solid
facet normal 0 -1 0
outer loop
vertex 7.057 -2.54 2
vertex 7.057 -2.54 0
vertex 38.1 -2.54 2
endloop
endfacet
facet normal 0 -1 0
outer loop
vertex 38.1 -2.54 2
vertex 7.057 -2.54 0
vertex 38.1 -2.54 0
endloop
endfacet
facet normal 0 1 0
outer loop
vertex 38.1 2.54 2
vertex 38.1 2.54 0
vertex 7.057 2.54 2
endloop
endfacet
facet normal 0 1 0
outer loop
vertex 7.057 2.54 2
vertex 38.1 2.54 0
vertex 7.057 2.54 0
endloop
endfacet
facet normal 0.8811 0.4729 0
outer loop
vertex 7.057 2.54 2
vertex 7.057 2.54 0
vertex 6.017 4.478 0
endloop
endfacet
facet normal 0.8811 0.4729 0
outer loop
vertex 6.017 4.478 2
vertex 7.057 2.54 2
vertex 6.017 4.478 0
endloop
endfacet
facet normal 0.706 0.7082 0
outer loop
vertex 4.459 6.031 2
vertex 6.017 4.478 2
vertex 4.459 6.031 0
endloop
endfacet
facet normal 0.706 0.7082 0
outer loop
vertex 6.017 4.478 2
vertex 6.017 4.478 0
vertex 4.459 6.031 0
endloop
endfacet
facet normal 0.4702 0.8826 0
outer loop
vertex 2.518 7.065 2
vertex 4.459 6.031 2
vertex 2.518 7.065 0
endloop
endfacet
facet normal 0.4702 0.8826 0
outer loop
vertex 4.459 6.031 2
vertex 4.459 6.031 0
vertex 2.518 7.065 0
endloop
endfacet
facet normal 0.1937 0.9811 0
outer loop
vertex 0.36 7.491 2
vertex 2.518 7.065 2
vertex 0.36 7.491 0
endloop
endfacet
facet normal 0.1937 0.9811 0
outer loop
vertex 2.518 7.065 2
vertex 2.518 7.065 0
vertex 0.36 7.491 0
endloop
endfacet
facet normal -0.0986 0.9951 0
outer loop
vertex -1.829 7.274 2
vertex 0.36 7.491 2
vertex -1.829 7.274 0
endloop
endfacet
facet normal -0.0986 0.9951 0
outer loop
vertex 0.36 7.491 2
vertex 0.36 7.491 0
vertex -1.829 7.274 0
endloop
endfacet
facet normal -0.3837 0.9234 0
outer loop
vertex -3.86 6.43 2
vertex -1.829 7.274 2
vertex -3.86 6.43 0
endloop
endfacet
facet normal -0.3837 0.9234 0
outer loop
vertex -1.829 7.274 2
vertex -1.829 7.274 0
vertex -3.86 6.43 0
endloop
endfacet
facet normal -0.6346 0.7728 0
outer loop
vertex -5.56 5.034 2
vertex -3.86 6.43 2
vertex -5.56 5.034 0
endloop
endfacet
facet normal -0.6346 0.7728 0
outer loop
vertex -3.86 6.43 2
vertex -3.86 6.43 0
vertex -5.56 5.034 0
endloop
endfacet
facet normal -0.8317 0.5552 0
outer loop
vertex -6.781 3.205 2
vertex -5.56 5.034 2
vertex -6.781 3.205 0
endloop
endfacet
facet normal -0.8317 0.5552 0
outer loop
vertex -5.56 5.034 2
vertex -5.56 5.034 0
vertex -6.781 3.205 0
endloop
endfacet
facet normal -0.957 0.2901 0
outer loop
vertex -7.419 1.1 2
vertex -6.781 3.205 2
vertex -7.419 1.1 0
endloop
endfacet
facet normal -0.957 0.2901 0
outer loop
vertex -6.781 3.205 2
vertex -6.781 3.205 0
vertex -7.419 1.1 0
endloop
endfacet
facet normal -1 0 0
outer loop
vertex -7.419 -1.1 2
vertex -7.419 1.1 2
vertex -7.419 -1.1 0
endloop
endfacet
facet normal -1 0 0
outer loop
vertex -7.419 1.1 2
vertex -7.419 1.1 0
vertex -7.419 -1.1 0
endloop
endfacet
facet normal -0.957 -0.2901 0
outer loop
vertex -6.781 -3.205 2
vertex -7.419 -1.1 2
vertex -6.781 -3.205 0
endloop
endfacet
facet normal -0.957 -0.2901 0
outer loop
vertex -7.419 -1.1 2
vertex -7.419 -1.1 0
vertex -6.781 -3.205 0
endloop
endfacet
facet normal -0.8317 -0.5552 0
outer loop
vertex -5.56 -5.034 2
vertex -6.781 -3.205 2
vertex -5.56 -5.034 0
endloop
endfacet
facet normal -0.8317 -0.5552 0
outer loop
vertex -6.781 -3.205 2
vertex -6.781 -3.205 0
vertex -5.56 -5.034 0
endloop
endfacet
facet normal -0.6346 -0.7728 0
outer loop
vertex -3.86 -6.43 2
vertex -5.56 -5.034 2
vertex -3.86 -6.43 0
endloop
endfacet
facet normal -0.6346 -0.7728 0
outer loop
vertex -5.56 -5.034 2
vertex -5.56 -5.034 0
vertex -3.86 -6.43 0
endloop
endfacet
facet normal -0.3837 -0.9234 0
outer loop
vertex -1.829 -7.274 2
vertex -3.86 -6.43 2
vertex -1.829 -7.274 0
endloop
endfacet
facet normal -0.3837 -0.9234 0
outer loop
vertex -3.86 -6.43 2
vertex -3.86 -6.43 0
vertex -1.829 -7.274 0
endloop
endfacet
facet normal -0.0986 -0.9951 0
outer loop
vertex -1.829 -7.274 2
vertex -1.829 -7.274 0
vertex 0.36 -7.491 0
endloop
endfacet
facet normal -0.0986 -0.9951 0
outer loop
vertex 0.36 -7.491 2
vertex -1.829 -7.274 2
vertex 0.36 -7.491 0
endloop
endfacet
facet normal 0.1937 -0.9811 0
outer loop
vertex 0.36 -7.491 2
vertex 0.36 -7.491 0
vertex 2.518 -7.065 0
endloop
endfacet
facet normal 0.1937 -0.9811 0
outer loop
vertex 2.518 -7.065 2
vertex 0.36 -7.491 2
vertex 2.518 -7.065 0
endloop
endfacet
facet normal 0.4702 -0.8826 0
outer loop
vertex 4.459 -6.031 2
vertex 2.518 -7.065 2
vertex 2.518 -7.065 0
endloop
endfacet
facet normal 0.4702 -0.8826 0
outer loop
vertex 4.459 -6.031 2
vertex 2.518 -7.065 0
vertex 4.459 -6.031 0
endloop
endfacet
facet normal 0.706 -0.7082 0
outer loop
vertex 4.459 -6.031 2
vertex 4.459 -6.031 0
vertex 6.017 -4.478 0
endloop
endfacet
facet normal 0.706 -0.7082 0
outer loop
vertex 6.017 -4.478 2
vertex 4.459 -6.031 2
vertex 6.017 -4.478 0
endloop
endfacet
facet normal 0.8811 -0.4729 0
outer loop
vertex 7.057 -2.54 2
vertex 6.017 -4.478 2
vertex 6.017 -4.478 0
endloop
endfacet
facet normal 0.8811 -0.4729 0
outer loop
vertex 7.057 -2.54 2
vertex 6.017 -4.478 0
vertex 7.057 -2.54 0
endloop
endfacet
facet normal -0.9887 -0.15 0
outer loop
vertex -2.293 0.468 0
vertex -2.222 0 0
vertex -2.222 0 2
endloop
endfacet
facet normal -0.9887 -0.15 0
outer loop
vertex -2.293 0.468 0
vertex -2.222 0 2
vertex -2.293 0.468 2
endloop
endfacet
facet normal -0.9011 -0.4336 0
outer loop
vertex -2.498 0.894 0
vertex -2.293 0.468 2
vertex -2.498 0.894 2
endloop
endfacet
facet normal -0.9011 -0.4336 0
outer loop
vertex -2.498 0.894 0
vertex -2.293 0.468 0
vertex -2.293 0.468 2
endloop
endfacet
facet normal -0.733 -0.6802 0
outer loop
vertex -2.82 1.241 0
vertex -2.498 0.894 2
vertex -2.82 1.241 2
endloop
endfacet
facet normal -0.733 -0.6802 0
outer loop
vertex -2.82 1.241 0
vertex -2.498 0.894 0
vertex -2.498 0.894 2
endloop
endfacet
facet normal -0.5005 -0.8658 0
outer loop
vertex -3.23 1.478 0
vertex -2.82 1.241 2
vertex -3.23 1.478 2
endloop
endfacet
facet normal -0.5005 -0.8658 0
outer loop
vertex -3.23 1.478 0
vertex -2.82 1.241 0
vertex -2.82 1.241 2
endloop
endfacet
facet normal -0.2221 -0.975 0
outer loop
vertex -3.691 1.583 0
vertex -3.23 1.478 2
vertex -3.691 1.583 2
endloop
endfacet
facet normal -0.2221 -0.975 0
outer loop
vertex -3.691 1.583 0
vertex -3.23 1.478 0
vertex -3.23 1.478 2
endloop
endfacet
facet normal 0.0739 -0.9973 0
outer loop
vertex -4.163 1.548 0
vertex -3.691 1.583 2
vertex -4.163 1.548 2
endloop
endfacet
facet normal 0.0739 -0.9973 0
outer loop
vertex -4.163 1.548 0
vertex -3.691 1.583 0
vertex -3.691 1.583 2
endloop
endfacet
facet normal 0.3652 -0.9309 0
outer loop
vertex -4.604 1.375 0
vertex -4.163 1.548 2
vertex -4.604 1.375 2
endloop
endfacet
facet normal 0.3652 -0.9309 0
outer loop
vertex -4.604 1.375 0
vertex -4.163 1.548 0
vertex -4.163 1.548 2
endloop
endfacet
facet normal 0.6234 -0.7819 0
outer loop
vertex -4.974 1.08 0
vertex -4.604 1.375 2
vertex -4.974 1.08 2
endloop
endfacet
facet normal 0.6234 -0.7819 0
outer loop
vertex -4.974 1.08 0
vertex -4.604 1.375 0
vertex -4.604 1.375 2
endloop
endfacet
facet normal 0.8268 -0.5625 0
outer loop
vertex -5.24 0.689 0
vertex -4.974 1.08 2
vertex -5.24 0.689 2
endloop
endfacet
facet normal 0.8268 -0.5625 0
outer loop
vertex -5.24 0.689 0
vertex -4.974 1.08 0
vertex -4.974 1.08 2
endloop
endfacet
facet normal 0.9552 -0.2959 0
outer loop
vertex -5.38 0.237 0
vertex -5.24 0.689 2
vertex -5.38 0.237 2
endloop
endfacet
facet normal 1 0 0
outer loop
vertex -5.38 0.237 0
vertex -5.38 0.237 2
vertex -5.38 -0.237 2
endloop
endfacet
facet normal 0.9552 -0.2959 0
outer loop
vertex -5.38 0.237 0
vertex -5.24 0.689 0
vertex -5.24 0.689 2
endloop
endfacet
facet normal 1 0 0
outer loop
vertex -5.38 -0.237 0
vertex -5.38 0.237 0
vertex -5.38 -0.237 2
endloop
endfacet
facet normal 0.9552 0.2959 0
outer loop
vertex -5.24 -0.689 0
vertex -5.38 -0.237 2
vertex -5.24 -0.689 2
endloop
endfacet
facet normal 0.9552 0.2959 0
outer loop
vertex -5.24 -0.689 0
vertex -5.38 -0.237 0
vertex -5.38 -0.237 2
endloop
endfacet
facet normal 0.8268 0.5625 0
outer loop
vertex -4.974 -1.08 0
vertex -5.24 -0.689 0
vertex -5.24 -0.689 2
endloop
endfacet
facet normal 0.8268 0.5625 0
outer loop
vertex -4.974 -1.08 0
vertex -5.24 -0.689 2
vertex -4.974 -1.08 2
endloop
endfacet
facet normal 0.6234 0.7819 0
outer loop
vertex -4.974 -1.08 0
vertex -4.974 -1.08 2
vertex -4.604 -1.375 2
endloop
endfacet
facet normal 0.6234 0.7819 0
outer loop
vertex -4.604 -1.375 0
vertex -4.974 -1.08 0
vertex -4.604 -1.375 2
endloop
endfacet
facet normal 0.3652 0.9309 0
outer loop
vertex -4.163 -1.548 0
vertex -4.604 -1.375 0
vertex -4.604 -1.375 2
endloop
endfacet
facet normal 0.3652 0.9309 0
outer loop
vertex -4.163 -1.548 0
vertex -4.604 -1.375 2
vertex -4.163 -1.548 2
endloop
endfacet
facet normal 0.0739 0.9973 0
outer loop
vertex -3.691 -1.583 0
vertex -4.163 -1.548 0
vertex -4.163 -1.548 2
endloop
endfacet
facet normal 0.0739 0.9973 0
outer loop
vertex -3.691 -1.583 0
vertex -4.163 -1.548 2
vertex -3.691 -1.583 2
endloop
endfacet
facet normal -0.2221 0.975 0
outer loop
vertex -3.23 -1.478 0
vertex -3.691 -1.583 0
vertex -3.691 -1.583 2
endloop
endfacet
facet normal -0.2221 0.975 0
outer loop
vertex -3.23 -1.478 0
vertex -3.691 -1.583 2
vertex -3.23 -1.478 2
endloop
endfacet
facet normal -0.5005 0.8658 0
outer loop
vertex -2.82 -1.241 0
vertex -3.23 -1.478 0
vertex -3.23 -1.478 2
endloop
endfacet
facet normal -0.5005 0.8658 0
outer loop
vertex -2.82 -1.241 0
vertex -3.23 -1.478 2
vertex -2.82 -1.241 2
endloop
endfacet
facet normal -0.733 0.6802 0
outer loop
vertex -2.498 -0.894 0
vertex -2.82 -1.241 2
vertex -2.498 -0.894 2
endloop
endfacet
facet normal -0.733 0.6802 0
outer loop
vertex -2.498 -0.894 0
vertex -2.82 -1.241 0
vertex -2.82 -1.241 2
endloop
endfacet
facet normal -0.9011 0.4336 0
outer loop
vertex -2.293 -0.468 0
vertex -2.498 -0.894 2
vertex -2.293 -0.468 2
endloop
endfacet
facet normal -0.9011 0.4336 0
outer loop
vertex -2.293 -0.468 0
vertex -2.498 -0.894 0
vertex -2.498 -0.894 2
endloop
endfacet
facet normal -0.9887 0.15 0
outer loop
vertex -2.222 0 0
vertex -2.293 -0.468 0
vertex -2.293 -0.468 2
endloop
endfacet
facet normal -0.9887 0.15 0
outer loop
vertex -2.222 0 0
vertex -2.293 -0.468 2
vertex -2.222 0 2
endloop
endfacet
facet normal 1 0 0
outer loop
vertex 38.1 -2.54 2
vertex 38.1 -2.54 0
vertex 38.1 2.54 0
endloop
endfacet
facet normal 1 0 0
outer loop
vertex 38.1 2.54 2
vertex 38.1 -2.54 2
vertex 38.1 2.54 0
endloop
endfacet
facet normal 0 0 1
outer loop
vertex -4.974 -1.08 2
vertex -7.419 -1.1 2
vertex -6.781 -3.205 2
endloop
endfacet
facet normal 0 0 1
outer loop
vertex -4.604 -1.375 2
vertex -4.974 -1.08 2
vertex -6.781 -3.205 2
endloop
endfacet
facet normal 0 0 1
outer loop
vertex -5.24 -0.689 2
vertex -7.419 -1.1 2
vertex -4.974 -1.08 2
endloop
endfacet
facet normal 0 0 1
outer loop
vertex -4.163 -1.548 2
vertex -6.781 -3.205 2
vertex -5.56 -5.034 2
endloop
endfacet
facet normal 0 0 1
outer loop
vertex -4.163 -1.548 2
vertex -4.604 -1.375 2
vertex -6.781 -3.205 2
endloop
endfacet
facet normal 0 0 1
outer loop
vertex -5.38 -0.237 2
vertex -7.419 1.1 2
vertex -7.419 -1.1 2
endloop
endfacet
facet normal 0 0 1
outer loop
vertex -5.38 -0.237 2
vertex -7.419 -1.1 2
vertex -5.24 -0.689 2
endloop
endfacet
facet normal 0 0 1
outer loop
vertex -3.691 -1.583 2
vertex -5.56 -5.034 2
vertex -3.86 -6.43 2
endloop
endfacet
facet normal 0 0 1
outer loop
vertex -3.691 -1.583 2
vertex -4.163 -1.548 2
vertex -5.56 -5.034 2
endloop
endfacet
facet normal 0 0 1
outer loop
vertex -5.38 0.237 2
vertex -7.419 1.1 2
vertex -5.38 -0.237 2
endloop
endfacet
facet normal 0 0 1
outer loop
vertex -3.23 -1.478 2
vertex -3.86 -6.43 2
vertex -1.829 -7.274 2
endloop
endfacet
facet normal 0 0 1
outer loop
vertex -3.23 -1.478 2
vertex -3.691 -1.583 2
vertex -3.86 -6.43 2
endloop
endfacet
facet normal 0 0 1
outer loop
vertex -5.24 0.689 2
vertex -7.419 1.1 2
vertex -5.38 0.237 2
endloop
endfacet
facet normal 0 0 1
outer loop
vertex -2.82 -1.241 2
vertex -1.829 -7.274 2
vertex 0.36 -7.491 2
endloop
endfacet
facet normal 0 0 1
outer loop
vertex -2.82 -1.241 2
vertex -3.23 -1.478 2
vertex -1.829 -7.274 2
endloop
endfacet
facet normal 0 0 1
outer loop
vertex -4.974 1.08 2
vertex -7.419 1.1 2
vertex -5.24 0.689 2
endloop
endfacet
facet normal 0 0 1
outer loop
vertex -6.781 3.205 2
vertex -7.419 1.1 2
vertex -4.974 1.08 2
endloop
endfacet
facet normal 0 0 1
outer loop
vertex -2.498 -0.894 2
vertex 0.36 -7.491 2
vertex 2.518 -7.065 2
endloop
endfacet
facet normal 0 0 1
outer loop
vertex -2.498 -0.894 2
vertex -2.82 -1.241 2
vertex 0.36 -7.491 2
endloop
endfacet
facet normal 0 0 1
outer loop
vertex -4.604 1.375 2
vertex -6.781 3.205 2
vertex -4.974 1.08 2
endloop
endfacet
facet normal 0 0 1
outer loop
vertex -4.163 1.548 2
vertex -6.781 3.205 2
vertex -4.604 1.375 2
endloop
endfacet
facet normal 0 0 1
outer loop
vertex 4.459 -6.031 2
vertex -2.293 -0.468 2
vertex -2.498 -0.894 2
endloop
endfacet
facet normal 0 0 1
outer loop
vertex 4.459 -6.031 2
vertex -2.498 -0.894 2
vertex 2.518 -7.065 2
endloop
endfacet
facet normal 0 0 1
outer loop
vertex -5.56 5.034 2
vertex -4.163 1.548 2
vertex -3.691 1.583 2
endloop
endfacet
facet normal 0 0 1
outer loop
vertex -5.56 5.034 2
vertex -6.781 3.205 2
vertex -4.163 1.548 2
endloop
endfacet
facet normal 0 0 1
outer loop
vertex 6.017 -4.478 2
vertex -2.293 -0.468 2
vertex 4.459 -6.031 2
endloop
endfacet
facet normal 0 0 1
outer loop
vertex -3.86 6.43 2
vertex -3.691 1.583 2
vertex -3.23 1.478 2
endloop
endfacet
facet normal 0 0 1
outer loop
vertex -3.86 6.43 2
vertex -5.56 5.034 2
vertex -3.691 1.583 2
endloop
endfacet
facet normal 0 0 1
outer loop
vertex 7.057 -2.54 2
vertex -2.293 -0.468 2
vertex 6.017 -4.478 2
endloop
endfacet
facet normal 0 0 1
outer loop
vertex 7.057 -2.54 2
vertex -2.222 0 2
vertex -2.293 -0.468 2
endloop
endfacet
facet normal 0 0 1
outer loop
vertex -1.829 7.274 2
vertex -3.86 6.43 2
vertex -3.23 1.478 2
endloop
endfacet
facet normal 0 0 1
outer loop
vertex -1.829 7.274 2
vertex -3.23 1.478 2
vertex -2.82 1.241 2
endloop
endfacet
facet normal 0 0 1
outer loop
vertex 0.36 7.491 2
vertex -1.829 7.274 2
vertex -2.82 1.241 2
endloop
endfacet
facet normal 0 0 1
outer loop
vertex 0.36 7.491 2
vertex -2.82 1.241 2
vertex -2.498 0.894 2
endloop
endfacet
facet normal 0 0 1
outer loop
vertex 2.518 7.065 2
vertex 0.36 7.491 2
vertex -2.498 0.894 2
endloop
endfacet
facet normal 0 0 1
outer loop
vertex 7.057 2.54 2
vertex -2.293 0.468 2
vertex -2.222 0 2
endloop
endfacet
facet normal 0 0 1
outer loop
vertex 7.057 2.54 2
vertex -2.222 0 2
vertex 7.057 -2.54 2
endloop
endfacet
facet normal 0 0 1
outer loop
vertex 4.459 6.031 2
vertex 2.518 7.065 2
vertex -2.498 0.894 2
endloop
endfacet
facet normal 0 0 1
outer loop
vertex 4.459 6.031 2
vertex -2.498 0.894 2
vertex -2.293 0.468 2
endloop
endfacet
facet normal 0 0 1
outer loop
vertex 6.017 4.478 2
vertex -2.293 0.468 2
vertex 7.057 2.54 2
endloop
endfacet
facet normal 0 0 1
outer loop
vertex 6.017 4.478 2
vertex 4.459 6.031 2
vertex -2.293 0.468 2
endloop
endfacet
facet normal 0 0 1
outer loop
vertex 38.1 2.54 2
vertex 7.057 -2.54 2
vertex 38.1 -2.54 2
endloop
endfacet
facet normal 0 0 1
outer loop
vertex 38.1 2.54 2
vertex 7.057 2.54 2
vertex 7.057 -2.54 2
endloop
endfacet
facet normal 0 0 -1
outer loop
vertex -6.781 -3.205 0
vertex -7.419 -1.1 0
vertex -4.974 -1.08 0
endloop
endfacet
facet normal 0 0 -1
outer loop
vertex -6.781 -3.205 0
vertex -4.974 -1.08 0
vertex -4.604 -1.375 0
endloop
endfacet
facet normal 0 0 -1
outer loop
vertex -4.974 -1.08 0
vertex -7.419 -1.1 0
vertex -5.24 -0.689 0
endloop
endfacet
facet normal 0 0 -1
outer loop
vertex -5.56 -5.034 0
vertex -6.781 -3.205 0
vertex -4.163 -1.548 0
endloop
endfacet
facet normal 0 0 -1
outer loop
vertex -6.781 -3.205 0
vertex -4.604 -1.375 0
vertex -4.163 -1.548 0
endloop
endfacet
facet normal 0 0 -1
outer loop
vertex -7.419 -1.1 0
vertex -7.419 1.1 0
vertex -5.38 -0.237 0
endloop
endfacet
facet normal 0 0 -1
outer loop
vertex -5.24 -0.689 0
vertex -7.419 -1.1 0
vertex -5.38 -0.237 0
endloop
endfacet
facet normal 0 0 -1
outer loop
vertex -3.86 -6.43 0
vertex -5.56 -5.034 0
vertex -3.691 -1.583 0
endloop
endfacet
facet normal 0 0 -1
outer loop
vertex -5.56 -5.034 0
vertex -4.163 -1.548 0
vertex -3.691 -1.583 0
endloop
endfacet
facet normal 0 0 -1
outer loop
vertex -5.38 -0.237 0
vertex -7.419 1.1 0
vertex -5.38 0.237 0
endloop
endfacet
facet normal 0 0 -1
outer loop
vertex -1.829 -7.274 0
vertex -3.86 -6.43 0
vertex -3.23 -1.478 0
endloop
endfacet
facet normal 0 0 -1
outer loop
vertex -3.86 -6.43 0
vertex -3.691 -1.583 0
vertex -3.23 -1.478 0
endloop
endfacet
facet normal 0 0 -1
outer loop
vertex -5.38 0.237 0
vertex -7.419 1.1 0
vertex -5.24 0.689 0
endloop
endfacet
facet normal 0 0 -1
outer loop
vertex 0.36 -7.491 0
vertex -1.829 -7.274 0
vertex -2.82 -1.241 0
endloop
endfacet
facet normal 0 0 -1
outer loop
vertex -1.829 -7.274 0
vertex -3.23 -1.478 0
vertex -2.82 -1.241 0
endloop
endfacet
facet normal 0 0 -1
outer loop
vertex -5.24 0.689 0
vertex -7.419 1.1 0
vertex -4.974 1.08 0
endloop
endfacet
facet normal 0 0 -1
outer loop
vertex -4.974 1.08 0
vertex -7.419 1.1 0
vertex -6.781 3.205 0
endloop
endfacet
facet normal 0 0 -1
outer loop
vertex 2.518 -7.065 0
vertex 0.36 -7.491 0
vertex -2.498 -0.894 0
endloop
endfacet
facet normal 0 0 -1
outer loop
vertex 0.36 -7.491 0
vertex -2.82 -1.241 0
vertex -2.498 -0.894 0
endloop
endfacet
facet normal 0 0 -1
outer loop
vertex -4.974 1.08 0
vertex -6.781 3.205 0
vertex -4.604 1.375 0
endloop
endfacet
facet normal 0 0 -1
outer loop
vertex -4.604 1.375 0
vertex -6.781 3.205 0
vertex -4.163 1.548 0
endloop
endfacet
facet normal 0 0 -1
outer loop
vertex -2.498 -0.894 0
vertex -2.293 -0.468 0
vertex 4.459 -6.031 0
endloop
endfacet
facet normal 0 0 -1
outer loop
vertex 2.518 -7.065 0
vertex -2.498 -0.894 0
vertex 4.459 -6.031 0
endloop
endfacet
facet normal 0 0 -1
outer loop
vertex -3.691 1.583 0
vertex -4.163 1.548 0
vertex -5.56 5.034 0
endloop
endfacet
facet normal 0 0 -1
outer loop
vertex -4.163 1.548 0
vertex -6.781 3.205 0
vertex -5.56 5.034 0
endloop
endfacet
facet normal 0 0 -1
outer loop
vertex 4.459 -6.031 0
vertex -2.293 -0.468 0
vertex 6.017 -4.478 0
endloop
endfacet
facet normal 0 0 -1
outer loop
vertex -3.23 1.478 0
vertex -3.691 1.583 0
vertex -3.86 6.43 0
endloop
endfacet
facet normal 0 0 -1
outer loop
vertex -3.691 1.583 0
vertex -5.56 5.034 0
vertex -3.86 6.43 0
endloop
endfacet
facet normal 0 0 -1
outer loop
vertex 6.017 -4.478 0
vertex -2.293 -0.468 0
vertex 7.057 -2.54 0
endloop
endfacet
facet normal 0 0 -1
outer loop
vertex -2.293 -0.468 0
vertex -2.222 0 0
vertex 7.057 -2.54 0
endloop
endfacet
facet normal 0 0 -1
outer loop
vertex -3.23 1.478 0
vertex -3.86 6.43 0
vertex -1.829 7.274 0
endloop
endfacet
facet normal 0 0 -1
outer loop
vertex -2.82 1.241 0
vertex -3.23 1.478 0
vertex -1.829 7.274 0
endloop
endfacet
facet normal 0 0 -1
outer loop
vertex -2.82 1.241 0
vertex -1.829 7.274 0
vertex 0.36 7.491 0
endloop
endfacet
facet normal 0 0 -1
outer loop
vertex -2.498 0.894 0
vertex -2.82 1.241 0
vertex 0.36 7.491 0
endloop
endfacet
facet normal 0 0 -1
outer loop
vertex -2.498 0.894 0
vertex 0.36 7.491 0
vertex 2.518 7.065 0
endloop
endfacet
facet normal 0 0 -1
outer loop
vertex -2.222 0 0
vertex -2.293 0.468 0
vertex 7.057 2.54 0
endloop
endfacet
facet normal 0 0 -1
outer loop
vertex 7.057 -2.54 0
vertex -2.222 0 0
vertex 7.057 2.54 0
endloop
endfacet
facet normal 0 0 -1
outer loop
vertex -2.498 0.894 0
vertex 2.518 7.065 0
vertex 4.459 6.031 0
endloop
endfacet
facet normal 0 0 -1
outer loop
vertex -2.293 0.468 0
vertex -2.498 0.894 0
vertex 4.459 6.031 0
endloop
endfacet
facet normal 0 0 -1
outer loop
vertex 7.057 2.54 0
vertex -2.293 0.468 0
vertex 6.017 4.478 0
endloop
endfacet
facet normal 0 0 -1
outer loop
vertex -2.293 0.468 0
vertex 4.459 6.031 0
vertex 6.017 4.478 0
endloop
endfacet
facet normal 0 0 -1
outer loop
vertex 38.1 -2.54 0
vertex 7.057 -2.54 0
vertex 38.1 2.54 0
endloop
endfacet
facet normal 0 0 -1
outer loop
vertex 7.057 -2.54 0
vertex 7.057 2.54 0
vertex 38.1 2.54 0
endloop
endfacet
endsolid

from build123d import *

# Parameters (mm, degrees)
F0_R     = 1.5875
F1_DEPTH = 2


with BuildPart() as f1:
    # F0 (on Top) → F1 (new body)
    with BuildSketch(Plane.XY):
        with BuildLine():
            ThreePointArc((7.0567981408, -2.54), (7.3883687664, -1.2891884936), (7.5, 0))
            ThreePointArc((7.5, 0), (7.3883687664, 1.2891884936), (7.0567981408, 2.54))
            Line((7.0567981408, 2.54), (0, 2.54))
            Line((0, 2.54), (0, -2.54))
            Line((0, -2.54), (7.0567981408, -2.54))
        make_face()
        with BuildLine():
            ThreePointArc((7.0567981408, 2.54), (7.3883687664, 1.2891884936), (7.5, 0))
            ThreePointArc((7.5, 0), (7.3883687664, -1.2891884936), (7.0567981408, -2.54))
            Line((7.0567981408, -2.54), (38.1, -2.54))
            Line((38.1, -2.54), (38.1, 2.54))
            Line((38.1, 2.54), (7.0567981408, 2.54))
        make_face()
        with BuildLine():
            Line((0, 2.54), (7.0567981408, 2.54))
            ThreePointArc((7.0567981408, 2.54), (-7.5, 0), (7.0567981408, -2.54))
            Line((7.0567981408, -2.54), (0, -2.54))
            Line((0, -2.54), (0, 2.54))
        make_face()
        with Locations((-3.81, 0)):
            Circle(F0_R, mode=Mode.SUBTRACT)
    extrude(amount=F1_DEPTH)


solid = f1.part
